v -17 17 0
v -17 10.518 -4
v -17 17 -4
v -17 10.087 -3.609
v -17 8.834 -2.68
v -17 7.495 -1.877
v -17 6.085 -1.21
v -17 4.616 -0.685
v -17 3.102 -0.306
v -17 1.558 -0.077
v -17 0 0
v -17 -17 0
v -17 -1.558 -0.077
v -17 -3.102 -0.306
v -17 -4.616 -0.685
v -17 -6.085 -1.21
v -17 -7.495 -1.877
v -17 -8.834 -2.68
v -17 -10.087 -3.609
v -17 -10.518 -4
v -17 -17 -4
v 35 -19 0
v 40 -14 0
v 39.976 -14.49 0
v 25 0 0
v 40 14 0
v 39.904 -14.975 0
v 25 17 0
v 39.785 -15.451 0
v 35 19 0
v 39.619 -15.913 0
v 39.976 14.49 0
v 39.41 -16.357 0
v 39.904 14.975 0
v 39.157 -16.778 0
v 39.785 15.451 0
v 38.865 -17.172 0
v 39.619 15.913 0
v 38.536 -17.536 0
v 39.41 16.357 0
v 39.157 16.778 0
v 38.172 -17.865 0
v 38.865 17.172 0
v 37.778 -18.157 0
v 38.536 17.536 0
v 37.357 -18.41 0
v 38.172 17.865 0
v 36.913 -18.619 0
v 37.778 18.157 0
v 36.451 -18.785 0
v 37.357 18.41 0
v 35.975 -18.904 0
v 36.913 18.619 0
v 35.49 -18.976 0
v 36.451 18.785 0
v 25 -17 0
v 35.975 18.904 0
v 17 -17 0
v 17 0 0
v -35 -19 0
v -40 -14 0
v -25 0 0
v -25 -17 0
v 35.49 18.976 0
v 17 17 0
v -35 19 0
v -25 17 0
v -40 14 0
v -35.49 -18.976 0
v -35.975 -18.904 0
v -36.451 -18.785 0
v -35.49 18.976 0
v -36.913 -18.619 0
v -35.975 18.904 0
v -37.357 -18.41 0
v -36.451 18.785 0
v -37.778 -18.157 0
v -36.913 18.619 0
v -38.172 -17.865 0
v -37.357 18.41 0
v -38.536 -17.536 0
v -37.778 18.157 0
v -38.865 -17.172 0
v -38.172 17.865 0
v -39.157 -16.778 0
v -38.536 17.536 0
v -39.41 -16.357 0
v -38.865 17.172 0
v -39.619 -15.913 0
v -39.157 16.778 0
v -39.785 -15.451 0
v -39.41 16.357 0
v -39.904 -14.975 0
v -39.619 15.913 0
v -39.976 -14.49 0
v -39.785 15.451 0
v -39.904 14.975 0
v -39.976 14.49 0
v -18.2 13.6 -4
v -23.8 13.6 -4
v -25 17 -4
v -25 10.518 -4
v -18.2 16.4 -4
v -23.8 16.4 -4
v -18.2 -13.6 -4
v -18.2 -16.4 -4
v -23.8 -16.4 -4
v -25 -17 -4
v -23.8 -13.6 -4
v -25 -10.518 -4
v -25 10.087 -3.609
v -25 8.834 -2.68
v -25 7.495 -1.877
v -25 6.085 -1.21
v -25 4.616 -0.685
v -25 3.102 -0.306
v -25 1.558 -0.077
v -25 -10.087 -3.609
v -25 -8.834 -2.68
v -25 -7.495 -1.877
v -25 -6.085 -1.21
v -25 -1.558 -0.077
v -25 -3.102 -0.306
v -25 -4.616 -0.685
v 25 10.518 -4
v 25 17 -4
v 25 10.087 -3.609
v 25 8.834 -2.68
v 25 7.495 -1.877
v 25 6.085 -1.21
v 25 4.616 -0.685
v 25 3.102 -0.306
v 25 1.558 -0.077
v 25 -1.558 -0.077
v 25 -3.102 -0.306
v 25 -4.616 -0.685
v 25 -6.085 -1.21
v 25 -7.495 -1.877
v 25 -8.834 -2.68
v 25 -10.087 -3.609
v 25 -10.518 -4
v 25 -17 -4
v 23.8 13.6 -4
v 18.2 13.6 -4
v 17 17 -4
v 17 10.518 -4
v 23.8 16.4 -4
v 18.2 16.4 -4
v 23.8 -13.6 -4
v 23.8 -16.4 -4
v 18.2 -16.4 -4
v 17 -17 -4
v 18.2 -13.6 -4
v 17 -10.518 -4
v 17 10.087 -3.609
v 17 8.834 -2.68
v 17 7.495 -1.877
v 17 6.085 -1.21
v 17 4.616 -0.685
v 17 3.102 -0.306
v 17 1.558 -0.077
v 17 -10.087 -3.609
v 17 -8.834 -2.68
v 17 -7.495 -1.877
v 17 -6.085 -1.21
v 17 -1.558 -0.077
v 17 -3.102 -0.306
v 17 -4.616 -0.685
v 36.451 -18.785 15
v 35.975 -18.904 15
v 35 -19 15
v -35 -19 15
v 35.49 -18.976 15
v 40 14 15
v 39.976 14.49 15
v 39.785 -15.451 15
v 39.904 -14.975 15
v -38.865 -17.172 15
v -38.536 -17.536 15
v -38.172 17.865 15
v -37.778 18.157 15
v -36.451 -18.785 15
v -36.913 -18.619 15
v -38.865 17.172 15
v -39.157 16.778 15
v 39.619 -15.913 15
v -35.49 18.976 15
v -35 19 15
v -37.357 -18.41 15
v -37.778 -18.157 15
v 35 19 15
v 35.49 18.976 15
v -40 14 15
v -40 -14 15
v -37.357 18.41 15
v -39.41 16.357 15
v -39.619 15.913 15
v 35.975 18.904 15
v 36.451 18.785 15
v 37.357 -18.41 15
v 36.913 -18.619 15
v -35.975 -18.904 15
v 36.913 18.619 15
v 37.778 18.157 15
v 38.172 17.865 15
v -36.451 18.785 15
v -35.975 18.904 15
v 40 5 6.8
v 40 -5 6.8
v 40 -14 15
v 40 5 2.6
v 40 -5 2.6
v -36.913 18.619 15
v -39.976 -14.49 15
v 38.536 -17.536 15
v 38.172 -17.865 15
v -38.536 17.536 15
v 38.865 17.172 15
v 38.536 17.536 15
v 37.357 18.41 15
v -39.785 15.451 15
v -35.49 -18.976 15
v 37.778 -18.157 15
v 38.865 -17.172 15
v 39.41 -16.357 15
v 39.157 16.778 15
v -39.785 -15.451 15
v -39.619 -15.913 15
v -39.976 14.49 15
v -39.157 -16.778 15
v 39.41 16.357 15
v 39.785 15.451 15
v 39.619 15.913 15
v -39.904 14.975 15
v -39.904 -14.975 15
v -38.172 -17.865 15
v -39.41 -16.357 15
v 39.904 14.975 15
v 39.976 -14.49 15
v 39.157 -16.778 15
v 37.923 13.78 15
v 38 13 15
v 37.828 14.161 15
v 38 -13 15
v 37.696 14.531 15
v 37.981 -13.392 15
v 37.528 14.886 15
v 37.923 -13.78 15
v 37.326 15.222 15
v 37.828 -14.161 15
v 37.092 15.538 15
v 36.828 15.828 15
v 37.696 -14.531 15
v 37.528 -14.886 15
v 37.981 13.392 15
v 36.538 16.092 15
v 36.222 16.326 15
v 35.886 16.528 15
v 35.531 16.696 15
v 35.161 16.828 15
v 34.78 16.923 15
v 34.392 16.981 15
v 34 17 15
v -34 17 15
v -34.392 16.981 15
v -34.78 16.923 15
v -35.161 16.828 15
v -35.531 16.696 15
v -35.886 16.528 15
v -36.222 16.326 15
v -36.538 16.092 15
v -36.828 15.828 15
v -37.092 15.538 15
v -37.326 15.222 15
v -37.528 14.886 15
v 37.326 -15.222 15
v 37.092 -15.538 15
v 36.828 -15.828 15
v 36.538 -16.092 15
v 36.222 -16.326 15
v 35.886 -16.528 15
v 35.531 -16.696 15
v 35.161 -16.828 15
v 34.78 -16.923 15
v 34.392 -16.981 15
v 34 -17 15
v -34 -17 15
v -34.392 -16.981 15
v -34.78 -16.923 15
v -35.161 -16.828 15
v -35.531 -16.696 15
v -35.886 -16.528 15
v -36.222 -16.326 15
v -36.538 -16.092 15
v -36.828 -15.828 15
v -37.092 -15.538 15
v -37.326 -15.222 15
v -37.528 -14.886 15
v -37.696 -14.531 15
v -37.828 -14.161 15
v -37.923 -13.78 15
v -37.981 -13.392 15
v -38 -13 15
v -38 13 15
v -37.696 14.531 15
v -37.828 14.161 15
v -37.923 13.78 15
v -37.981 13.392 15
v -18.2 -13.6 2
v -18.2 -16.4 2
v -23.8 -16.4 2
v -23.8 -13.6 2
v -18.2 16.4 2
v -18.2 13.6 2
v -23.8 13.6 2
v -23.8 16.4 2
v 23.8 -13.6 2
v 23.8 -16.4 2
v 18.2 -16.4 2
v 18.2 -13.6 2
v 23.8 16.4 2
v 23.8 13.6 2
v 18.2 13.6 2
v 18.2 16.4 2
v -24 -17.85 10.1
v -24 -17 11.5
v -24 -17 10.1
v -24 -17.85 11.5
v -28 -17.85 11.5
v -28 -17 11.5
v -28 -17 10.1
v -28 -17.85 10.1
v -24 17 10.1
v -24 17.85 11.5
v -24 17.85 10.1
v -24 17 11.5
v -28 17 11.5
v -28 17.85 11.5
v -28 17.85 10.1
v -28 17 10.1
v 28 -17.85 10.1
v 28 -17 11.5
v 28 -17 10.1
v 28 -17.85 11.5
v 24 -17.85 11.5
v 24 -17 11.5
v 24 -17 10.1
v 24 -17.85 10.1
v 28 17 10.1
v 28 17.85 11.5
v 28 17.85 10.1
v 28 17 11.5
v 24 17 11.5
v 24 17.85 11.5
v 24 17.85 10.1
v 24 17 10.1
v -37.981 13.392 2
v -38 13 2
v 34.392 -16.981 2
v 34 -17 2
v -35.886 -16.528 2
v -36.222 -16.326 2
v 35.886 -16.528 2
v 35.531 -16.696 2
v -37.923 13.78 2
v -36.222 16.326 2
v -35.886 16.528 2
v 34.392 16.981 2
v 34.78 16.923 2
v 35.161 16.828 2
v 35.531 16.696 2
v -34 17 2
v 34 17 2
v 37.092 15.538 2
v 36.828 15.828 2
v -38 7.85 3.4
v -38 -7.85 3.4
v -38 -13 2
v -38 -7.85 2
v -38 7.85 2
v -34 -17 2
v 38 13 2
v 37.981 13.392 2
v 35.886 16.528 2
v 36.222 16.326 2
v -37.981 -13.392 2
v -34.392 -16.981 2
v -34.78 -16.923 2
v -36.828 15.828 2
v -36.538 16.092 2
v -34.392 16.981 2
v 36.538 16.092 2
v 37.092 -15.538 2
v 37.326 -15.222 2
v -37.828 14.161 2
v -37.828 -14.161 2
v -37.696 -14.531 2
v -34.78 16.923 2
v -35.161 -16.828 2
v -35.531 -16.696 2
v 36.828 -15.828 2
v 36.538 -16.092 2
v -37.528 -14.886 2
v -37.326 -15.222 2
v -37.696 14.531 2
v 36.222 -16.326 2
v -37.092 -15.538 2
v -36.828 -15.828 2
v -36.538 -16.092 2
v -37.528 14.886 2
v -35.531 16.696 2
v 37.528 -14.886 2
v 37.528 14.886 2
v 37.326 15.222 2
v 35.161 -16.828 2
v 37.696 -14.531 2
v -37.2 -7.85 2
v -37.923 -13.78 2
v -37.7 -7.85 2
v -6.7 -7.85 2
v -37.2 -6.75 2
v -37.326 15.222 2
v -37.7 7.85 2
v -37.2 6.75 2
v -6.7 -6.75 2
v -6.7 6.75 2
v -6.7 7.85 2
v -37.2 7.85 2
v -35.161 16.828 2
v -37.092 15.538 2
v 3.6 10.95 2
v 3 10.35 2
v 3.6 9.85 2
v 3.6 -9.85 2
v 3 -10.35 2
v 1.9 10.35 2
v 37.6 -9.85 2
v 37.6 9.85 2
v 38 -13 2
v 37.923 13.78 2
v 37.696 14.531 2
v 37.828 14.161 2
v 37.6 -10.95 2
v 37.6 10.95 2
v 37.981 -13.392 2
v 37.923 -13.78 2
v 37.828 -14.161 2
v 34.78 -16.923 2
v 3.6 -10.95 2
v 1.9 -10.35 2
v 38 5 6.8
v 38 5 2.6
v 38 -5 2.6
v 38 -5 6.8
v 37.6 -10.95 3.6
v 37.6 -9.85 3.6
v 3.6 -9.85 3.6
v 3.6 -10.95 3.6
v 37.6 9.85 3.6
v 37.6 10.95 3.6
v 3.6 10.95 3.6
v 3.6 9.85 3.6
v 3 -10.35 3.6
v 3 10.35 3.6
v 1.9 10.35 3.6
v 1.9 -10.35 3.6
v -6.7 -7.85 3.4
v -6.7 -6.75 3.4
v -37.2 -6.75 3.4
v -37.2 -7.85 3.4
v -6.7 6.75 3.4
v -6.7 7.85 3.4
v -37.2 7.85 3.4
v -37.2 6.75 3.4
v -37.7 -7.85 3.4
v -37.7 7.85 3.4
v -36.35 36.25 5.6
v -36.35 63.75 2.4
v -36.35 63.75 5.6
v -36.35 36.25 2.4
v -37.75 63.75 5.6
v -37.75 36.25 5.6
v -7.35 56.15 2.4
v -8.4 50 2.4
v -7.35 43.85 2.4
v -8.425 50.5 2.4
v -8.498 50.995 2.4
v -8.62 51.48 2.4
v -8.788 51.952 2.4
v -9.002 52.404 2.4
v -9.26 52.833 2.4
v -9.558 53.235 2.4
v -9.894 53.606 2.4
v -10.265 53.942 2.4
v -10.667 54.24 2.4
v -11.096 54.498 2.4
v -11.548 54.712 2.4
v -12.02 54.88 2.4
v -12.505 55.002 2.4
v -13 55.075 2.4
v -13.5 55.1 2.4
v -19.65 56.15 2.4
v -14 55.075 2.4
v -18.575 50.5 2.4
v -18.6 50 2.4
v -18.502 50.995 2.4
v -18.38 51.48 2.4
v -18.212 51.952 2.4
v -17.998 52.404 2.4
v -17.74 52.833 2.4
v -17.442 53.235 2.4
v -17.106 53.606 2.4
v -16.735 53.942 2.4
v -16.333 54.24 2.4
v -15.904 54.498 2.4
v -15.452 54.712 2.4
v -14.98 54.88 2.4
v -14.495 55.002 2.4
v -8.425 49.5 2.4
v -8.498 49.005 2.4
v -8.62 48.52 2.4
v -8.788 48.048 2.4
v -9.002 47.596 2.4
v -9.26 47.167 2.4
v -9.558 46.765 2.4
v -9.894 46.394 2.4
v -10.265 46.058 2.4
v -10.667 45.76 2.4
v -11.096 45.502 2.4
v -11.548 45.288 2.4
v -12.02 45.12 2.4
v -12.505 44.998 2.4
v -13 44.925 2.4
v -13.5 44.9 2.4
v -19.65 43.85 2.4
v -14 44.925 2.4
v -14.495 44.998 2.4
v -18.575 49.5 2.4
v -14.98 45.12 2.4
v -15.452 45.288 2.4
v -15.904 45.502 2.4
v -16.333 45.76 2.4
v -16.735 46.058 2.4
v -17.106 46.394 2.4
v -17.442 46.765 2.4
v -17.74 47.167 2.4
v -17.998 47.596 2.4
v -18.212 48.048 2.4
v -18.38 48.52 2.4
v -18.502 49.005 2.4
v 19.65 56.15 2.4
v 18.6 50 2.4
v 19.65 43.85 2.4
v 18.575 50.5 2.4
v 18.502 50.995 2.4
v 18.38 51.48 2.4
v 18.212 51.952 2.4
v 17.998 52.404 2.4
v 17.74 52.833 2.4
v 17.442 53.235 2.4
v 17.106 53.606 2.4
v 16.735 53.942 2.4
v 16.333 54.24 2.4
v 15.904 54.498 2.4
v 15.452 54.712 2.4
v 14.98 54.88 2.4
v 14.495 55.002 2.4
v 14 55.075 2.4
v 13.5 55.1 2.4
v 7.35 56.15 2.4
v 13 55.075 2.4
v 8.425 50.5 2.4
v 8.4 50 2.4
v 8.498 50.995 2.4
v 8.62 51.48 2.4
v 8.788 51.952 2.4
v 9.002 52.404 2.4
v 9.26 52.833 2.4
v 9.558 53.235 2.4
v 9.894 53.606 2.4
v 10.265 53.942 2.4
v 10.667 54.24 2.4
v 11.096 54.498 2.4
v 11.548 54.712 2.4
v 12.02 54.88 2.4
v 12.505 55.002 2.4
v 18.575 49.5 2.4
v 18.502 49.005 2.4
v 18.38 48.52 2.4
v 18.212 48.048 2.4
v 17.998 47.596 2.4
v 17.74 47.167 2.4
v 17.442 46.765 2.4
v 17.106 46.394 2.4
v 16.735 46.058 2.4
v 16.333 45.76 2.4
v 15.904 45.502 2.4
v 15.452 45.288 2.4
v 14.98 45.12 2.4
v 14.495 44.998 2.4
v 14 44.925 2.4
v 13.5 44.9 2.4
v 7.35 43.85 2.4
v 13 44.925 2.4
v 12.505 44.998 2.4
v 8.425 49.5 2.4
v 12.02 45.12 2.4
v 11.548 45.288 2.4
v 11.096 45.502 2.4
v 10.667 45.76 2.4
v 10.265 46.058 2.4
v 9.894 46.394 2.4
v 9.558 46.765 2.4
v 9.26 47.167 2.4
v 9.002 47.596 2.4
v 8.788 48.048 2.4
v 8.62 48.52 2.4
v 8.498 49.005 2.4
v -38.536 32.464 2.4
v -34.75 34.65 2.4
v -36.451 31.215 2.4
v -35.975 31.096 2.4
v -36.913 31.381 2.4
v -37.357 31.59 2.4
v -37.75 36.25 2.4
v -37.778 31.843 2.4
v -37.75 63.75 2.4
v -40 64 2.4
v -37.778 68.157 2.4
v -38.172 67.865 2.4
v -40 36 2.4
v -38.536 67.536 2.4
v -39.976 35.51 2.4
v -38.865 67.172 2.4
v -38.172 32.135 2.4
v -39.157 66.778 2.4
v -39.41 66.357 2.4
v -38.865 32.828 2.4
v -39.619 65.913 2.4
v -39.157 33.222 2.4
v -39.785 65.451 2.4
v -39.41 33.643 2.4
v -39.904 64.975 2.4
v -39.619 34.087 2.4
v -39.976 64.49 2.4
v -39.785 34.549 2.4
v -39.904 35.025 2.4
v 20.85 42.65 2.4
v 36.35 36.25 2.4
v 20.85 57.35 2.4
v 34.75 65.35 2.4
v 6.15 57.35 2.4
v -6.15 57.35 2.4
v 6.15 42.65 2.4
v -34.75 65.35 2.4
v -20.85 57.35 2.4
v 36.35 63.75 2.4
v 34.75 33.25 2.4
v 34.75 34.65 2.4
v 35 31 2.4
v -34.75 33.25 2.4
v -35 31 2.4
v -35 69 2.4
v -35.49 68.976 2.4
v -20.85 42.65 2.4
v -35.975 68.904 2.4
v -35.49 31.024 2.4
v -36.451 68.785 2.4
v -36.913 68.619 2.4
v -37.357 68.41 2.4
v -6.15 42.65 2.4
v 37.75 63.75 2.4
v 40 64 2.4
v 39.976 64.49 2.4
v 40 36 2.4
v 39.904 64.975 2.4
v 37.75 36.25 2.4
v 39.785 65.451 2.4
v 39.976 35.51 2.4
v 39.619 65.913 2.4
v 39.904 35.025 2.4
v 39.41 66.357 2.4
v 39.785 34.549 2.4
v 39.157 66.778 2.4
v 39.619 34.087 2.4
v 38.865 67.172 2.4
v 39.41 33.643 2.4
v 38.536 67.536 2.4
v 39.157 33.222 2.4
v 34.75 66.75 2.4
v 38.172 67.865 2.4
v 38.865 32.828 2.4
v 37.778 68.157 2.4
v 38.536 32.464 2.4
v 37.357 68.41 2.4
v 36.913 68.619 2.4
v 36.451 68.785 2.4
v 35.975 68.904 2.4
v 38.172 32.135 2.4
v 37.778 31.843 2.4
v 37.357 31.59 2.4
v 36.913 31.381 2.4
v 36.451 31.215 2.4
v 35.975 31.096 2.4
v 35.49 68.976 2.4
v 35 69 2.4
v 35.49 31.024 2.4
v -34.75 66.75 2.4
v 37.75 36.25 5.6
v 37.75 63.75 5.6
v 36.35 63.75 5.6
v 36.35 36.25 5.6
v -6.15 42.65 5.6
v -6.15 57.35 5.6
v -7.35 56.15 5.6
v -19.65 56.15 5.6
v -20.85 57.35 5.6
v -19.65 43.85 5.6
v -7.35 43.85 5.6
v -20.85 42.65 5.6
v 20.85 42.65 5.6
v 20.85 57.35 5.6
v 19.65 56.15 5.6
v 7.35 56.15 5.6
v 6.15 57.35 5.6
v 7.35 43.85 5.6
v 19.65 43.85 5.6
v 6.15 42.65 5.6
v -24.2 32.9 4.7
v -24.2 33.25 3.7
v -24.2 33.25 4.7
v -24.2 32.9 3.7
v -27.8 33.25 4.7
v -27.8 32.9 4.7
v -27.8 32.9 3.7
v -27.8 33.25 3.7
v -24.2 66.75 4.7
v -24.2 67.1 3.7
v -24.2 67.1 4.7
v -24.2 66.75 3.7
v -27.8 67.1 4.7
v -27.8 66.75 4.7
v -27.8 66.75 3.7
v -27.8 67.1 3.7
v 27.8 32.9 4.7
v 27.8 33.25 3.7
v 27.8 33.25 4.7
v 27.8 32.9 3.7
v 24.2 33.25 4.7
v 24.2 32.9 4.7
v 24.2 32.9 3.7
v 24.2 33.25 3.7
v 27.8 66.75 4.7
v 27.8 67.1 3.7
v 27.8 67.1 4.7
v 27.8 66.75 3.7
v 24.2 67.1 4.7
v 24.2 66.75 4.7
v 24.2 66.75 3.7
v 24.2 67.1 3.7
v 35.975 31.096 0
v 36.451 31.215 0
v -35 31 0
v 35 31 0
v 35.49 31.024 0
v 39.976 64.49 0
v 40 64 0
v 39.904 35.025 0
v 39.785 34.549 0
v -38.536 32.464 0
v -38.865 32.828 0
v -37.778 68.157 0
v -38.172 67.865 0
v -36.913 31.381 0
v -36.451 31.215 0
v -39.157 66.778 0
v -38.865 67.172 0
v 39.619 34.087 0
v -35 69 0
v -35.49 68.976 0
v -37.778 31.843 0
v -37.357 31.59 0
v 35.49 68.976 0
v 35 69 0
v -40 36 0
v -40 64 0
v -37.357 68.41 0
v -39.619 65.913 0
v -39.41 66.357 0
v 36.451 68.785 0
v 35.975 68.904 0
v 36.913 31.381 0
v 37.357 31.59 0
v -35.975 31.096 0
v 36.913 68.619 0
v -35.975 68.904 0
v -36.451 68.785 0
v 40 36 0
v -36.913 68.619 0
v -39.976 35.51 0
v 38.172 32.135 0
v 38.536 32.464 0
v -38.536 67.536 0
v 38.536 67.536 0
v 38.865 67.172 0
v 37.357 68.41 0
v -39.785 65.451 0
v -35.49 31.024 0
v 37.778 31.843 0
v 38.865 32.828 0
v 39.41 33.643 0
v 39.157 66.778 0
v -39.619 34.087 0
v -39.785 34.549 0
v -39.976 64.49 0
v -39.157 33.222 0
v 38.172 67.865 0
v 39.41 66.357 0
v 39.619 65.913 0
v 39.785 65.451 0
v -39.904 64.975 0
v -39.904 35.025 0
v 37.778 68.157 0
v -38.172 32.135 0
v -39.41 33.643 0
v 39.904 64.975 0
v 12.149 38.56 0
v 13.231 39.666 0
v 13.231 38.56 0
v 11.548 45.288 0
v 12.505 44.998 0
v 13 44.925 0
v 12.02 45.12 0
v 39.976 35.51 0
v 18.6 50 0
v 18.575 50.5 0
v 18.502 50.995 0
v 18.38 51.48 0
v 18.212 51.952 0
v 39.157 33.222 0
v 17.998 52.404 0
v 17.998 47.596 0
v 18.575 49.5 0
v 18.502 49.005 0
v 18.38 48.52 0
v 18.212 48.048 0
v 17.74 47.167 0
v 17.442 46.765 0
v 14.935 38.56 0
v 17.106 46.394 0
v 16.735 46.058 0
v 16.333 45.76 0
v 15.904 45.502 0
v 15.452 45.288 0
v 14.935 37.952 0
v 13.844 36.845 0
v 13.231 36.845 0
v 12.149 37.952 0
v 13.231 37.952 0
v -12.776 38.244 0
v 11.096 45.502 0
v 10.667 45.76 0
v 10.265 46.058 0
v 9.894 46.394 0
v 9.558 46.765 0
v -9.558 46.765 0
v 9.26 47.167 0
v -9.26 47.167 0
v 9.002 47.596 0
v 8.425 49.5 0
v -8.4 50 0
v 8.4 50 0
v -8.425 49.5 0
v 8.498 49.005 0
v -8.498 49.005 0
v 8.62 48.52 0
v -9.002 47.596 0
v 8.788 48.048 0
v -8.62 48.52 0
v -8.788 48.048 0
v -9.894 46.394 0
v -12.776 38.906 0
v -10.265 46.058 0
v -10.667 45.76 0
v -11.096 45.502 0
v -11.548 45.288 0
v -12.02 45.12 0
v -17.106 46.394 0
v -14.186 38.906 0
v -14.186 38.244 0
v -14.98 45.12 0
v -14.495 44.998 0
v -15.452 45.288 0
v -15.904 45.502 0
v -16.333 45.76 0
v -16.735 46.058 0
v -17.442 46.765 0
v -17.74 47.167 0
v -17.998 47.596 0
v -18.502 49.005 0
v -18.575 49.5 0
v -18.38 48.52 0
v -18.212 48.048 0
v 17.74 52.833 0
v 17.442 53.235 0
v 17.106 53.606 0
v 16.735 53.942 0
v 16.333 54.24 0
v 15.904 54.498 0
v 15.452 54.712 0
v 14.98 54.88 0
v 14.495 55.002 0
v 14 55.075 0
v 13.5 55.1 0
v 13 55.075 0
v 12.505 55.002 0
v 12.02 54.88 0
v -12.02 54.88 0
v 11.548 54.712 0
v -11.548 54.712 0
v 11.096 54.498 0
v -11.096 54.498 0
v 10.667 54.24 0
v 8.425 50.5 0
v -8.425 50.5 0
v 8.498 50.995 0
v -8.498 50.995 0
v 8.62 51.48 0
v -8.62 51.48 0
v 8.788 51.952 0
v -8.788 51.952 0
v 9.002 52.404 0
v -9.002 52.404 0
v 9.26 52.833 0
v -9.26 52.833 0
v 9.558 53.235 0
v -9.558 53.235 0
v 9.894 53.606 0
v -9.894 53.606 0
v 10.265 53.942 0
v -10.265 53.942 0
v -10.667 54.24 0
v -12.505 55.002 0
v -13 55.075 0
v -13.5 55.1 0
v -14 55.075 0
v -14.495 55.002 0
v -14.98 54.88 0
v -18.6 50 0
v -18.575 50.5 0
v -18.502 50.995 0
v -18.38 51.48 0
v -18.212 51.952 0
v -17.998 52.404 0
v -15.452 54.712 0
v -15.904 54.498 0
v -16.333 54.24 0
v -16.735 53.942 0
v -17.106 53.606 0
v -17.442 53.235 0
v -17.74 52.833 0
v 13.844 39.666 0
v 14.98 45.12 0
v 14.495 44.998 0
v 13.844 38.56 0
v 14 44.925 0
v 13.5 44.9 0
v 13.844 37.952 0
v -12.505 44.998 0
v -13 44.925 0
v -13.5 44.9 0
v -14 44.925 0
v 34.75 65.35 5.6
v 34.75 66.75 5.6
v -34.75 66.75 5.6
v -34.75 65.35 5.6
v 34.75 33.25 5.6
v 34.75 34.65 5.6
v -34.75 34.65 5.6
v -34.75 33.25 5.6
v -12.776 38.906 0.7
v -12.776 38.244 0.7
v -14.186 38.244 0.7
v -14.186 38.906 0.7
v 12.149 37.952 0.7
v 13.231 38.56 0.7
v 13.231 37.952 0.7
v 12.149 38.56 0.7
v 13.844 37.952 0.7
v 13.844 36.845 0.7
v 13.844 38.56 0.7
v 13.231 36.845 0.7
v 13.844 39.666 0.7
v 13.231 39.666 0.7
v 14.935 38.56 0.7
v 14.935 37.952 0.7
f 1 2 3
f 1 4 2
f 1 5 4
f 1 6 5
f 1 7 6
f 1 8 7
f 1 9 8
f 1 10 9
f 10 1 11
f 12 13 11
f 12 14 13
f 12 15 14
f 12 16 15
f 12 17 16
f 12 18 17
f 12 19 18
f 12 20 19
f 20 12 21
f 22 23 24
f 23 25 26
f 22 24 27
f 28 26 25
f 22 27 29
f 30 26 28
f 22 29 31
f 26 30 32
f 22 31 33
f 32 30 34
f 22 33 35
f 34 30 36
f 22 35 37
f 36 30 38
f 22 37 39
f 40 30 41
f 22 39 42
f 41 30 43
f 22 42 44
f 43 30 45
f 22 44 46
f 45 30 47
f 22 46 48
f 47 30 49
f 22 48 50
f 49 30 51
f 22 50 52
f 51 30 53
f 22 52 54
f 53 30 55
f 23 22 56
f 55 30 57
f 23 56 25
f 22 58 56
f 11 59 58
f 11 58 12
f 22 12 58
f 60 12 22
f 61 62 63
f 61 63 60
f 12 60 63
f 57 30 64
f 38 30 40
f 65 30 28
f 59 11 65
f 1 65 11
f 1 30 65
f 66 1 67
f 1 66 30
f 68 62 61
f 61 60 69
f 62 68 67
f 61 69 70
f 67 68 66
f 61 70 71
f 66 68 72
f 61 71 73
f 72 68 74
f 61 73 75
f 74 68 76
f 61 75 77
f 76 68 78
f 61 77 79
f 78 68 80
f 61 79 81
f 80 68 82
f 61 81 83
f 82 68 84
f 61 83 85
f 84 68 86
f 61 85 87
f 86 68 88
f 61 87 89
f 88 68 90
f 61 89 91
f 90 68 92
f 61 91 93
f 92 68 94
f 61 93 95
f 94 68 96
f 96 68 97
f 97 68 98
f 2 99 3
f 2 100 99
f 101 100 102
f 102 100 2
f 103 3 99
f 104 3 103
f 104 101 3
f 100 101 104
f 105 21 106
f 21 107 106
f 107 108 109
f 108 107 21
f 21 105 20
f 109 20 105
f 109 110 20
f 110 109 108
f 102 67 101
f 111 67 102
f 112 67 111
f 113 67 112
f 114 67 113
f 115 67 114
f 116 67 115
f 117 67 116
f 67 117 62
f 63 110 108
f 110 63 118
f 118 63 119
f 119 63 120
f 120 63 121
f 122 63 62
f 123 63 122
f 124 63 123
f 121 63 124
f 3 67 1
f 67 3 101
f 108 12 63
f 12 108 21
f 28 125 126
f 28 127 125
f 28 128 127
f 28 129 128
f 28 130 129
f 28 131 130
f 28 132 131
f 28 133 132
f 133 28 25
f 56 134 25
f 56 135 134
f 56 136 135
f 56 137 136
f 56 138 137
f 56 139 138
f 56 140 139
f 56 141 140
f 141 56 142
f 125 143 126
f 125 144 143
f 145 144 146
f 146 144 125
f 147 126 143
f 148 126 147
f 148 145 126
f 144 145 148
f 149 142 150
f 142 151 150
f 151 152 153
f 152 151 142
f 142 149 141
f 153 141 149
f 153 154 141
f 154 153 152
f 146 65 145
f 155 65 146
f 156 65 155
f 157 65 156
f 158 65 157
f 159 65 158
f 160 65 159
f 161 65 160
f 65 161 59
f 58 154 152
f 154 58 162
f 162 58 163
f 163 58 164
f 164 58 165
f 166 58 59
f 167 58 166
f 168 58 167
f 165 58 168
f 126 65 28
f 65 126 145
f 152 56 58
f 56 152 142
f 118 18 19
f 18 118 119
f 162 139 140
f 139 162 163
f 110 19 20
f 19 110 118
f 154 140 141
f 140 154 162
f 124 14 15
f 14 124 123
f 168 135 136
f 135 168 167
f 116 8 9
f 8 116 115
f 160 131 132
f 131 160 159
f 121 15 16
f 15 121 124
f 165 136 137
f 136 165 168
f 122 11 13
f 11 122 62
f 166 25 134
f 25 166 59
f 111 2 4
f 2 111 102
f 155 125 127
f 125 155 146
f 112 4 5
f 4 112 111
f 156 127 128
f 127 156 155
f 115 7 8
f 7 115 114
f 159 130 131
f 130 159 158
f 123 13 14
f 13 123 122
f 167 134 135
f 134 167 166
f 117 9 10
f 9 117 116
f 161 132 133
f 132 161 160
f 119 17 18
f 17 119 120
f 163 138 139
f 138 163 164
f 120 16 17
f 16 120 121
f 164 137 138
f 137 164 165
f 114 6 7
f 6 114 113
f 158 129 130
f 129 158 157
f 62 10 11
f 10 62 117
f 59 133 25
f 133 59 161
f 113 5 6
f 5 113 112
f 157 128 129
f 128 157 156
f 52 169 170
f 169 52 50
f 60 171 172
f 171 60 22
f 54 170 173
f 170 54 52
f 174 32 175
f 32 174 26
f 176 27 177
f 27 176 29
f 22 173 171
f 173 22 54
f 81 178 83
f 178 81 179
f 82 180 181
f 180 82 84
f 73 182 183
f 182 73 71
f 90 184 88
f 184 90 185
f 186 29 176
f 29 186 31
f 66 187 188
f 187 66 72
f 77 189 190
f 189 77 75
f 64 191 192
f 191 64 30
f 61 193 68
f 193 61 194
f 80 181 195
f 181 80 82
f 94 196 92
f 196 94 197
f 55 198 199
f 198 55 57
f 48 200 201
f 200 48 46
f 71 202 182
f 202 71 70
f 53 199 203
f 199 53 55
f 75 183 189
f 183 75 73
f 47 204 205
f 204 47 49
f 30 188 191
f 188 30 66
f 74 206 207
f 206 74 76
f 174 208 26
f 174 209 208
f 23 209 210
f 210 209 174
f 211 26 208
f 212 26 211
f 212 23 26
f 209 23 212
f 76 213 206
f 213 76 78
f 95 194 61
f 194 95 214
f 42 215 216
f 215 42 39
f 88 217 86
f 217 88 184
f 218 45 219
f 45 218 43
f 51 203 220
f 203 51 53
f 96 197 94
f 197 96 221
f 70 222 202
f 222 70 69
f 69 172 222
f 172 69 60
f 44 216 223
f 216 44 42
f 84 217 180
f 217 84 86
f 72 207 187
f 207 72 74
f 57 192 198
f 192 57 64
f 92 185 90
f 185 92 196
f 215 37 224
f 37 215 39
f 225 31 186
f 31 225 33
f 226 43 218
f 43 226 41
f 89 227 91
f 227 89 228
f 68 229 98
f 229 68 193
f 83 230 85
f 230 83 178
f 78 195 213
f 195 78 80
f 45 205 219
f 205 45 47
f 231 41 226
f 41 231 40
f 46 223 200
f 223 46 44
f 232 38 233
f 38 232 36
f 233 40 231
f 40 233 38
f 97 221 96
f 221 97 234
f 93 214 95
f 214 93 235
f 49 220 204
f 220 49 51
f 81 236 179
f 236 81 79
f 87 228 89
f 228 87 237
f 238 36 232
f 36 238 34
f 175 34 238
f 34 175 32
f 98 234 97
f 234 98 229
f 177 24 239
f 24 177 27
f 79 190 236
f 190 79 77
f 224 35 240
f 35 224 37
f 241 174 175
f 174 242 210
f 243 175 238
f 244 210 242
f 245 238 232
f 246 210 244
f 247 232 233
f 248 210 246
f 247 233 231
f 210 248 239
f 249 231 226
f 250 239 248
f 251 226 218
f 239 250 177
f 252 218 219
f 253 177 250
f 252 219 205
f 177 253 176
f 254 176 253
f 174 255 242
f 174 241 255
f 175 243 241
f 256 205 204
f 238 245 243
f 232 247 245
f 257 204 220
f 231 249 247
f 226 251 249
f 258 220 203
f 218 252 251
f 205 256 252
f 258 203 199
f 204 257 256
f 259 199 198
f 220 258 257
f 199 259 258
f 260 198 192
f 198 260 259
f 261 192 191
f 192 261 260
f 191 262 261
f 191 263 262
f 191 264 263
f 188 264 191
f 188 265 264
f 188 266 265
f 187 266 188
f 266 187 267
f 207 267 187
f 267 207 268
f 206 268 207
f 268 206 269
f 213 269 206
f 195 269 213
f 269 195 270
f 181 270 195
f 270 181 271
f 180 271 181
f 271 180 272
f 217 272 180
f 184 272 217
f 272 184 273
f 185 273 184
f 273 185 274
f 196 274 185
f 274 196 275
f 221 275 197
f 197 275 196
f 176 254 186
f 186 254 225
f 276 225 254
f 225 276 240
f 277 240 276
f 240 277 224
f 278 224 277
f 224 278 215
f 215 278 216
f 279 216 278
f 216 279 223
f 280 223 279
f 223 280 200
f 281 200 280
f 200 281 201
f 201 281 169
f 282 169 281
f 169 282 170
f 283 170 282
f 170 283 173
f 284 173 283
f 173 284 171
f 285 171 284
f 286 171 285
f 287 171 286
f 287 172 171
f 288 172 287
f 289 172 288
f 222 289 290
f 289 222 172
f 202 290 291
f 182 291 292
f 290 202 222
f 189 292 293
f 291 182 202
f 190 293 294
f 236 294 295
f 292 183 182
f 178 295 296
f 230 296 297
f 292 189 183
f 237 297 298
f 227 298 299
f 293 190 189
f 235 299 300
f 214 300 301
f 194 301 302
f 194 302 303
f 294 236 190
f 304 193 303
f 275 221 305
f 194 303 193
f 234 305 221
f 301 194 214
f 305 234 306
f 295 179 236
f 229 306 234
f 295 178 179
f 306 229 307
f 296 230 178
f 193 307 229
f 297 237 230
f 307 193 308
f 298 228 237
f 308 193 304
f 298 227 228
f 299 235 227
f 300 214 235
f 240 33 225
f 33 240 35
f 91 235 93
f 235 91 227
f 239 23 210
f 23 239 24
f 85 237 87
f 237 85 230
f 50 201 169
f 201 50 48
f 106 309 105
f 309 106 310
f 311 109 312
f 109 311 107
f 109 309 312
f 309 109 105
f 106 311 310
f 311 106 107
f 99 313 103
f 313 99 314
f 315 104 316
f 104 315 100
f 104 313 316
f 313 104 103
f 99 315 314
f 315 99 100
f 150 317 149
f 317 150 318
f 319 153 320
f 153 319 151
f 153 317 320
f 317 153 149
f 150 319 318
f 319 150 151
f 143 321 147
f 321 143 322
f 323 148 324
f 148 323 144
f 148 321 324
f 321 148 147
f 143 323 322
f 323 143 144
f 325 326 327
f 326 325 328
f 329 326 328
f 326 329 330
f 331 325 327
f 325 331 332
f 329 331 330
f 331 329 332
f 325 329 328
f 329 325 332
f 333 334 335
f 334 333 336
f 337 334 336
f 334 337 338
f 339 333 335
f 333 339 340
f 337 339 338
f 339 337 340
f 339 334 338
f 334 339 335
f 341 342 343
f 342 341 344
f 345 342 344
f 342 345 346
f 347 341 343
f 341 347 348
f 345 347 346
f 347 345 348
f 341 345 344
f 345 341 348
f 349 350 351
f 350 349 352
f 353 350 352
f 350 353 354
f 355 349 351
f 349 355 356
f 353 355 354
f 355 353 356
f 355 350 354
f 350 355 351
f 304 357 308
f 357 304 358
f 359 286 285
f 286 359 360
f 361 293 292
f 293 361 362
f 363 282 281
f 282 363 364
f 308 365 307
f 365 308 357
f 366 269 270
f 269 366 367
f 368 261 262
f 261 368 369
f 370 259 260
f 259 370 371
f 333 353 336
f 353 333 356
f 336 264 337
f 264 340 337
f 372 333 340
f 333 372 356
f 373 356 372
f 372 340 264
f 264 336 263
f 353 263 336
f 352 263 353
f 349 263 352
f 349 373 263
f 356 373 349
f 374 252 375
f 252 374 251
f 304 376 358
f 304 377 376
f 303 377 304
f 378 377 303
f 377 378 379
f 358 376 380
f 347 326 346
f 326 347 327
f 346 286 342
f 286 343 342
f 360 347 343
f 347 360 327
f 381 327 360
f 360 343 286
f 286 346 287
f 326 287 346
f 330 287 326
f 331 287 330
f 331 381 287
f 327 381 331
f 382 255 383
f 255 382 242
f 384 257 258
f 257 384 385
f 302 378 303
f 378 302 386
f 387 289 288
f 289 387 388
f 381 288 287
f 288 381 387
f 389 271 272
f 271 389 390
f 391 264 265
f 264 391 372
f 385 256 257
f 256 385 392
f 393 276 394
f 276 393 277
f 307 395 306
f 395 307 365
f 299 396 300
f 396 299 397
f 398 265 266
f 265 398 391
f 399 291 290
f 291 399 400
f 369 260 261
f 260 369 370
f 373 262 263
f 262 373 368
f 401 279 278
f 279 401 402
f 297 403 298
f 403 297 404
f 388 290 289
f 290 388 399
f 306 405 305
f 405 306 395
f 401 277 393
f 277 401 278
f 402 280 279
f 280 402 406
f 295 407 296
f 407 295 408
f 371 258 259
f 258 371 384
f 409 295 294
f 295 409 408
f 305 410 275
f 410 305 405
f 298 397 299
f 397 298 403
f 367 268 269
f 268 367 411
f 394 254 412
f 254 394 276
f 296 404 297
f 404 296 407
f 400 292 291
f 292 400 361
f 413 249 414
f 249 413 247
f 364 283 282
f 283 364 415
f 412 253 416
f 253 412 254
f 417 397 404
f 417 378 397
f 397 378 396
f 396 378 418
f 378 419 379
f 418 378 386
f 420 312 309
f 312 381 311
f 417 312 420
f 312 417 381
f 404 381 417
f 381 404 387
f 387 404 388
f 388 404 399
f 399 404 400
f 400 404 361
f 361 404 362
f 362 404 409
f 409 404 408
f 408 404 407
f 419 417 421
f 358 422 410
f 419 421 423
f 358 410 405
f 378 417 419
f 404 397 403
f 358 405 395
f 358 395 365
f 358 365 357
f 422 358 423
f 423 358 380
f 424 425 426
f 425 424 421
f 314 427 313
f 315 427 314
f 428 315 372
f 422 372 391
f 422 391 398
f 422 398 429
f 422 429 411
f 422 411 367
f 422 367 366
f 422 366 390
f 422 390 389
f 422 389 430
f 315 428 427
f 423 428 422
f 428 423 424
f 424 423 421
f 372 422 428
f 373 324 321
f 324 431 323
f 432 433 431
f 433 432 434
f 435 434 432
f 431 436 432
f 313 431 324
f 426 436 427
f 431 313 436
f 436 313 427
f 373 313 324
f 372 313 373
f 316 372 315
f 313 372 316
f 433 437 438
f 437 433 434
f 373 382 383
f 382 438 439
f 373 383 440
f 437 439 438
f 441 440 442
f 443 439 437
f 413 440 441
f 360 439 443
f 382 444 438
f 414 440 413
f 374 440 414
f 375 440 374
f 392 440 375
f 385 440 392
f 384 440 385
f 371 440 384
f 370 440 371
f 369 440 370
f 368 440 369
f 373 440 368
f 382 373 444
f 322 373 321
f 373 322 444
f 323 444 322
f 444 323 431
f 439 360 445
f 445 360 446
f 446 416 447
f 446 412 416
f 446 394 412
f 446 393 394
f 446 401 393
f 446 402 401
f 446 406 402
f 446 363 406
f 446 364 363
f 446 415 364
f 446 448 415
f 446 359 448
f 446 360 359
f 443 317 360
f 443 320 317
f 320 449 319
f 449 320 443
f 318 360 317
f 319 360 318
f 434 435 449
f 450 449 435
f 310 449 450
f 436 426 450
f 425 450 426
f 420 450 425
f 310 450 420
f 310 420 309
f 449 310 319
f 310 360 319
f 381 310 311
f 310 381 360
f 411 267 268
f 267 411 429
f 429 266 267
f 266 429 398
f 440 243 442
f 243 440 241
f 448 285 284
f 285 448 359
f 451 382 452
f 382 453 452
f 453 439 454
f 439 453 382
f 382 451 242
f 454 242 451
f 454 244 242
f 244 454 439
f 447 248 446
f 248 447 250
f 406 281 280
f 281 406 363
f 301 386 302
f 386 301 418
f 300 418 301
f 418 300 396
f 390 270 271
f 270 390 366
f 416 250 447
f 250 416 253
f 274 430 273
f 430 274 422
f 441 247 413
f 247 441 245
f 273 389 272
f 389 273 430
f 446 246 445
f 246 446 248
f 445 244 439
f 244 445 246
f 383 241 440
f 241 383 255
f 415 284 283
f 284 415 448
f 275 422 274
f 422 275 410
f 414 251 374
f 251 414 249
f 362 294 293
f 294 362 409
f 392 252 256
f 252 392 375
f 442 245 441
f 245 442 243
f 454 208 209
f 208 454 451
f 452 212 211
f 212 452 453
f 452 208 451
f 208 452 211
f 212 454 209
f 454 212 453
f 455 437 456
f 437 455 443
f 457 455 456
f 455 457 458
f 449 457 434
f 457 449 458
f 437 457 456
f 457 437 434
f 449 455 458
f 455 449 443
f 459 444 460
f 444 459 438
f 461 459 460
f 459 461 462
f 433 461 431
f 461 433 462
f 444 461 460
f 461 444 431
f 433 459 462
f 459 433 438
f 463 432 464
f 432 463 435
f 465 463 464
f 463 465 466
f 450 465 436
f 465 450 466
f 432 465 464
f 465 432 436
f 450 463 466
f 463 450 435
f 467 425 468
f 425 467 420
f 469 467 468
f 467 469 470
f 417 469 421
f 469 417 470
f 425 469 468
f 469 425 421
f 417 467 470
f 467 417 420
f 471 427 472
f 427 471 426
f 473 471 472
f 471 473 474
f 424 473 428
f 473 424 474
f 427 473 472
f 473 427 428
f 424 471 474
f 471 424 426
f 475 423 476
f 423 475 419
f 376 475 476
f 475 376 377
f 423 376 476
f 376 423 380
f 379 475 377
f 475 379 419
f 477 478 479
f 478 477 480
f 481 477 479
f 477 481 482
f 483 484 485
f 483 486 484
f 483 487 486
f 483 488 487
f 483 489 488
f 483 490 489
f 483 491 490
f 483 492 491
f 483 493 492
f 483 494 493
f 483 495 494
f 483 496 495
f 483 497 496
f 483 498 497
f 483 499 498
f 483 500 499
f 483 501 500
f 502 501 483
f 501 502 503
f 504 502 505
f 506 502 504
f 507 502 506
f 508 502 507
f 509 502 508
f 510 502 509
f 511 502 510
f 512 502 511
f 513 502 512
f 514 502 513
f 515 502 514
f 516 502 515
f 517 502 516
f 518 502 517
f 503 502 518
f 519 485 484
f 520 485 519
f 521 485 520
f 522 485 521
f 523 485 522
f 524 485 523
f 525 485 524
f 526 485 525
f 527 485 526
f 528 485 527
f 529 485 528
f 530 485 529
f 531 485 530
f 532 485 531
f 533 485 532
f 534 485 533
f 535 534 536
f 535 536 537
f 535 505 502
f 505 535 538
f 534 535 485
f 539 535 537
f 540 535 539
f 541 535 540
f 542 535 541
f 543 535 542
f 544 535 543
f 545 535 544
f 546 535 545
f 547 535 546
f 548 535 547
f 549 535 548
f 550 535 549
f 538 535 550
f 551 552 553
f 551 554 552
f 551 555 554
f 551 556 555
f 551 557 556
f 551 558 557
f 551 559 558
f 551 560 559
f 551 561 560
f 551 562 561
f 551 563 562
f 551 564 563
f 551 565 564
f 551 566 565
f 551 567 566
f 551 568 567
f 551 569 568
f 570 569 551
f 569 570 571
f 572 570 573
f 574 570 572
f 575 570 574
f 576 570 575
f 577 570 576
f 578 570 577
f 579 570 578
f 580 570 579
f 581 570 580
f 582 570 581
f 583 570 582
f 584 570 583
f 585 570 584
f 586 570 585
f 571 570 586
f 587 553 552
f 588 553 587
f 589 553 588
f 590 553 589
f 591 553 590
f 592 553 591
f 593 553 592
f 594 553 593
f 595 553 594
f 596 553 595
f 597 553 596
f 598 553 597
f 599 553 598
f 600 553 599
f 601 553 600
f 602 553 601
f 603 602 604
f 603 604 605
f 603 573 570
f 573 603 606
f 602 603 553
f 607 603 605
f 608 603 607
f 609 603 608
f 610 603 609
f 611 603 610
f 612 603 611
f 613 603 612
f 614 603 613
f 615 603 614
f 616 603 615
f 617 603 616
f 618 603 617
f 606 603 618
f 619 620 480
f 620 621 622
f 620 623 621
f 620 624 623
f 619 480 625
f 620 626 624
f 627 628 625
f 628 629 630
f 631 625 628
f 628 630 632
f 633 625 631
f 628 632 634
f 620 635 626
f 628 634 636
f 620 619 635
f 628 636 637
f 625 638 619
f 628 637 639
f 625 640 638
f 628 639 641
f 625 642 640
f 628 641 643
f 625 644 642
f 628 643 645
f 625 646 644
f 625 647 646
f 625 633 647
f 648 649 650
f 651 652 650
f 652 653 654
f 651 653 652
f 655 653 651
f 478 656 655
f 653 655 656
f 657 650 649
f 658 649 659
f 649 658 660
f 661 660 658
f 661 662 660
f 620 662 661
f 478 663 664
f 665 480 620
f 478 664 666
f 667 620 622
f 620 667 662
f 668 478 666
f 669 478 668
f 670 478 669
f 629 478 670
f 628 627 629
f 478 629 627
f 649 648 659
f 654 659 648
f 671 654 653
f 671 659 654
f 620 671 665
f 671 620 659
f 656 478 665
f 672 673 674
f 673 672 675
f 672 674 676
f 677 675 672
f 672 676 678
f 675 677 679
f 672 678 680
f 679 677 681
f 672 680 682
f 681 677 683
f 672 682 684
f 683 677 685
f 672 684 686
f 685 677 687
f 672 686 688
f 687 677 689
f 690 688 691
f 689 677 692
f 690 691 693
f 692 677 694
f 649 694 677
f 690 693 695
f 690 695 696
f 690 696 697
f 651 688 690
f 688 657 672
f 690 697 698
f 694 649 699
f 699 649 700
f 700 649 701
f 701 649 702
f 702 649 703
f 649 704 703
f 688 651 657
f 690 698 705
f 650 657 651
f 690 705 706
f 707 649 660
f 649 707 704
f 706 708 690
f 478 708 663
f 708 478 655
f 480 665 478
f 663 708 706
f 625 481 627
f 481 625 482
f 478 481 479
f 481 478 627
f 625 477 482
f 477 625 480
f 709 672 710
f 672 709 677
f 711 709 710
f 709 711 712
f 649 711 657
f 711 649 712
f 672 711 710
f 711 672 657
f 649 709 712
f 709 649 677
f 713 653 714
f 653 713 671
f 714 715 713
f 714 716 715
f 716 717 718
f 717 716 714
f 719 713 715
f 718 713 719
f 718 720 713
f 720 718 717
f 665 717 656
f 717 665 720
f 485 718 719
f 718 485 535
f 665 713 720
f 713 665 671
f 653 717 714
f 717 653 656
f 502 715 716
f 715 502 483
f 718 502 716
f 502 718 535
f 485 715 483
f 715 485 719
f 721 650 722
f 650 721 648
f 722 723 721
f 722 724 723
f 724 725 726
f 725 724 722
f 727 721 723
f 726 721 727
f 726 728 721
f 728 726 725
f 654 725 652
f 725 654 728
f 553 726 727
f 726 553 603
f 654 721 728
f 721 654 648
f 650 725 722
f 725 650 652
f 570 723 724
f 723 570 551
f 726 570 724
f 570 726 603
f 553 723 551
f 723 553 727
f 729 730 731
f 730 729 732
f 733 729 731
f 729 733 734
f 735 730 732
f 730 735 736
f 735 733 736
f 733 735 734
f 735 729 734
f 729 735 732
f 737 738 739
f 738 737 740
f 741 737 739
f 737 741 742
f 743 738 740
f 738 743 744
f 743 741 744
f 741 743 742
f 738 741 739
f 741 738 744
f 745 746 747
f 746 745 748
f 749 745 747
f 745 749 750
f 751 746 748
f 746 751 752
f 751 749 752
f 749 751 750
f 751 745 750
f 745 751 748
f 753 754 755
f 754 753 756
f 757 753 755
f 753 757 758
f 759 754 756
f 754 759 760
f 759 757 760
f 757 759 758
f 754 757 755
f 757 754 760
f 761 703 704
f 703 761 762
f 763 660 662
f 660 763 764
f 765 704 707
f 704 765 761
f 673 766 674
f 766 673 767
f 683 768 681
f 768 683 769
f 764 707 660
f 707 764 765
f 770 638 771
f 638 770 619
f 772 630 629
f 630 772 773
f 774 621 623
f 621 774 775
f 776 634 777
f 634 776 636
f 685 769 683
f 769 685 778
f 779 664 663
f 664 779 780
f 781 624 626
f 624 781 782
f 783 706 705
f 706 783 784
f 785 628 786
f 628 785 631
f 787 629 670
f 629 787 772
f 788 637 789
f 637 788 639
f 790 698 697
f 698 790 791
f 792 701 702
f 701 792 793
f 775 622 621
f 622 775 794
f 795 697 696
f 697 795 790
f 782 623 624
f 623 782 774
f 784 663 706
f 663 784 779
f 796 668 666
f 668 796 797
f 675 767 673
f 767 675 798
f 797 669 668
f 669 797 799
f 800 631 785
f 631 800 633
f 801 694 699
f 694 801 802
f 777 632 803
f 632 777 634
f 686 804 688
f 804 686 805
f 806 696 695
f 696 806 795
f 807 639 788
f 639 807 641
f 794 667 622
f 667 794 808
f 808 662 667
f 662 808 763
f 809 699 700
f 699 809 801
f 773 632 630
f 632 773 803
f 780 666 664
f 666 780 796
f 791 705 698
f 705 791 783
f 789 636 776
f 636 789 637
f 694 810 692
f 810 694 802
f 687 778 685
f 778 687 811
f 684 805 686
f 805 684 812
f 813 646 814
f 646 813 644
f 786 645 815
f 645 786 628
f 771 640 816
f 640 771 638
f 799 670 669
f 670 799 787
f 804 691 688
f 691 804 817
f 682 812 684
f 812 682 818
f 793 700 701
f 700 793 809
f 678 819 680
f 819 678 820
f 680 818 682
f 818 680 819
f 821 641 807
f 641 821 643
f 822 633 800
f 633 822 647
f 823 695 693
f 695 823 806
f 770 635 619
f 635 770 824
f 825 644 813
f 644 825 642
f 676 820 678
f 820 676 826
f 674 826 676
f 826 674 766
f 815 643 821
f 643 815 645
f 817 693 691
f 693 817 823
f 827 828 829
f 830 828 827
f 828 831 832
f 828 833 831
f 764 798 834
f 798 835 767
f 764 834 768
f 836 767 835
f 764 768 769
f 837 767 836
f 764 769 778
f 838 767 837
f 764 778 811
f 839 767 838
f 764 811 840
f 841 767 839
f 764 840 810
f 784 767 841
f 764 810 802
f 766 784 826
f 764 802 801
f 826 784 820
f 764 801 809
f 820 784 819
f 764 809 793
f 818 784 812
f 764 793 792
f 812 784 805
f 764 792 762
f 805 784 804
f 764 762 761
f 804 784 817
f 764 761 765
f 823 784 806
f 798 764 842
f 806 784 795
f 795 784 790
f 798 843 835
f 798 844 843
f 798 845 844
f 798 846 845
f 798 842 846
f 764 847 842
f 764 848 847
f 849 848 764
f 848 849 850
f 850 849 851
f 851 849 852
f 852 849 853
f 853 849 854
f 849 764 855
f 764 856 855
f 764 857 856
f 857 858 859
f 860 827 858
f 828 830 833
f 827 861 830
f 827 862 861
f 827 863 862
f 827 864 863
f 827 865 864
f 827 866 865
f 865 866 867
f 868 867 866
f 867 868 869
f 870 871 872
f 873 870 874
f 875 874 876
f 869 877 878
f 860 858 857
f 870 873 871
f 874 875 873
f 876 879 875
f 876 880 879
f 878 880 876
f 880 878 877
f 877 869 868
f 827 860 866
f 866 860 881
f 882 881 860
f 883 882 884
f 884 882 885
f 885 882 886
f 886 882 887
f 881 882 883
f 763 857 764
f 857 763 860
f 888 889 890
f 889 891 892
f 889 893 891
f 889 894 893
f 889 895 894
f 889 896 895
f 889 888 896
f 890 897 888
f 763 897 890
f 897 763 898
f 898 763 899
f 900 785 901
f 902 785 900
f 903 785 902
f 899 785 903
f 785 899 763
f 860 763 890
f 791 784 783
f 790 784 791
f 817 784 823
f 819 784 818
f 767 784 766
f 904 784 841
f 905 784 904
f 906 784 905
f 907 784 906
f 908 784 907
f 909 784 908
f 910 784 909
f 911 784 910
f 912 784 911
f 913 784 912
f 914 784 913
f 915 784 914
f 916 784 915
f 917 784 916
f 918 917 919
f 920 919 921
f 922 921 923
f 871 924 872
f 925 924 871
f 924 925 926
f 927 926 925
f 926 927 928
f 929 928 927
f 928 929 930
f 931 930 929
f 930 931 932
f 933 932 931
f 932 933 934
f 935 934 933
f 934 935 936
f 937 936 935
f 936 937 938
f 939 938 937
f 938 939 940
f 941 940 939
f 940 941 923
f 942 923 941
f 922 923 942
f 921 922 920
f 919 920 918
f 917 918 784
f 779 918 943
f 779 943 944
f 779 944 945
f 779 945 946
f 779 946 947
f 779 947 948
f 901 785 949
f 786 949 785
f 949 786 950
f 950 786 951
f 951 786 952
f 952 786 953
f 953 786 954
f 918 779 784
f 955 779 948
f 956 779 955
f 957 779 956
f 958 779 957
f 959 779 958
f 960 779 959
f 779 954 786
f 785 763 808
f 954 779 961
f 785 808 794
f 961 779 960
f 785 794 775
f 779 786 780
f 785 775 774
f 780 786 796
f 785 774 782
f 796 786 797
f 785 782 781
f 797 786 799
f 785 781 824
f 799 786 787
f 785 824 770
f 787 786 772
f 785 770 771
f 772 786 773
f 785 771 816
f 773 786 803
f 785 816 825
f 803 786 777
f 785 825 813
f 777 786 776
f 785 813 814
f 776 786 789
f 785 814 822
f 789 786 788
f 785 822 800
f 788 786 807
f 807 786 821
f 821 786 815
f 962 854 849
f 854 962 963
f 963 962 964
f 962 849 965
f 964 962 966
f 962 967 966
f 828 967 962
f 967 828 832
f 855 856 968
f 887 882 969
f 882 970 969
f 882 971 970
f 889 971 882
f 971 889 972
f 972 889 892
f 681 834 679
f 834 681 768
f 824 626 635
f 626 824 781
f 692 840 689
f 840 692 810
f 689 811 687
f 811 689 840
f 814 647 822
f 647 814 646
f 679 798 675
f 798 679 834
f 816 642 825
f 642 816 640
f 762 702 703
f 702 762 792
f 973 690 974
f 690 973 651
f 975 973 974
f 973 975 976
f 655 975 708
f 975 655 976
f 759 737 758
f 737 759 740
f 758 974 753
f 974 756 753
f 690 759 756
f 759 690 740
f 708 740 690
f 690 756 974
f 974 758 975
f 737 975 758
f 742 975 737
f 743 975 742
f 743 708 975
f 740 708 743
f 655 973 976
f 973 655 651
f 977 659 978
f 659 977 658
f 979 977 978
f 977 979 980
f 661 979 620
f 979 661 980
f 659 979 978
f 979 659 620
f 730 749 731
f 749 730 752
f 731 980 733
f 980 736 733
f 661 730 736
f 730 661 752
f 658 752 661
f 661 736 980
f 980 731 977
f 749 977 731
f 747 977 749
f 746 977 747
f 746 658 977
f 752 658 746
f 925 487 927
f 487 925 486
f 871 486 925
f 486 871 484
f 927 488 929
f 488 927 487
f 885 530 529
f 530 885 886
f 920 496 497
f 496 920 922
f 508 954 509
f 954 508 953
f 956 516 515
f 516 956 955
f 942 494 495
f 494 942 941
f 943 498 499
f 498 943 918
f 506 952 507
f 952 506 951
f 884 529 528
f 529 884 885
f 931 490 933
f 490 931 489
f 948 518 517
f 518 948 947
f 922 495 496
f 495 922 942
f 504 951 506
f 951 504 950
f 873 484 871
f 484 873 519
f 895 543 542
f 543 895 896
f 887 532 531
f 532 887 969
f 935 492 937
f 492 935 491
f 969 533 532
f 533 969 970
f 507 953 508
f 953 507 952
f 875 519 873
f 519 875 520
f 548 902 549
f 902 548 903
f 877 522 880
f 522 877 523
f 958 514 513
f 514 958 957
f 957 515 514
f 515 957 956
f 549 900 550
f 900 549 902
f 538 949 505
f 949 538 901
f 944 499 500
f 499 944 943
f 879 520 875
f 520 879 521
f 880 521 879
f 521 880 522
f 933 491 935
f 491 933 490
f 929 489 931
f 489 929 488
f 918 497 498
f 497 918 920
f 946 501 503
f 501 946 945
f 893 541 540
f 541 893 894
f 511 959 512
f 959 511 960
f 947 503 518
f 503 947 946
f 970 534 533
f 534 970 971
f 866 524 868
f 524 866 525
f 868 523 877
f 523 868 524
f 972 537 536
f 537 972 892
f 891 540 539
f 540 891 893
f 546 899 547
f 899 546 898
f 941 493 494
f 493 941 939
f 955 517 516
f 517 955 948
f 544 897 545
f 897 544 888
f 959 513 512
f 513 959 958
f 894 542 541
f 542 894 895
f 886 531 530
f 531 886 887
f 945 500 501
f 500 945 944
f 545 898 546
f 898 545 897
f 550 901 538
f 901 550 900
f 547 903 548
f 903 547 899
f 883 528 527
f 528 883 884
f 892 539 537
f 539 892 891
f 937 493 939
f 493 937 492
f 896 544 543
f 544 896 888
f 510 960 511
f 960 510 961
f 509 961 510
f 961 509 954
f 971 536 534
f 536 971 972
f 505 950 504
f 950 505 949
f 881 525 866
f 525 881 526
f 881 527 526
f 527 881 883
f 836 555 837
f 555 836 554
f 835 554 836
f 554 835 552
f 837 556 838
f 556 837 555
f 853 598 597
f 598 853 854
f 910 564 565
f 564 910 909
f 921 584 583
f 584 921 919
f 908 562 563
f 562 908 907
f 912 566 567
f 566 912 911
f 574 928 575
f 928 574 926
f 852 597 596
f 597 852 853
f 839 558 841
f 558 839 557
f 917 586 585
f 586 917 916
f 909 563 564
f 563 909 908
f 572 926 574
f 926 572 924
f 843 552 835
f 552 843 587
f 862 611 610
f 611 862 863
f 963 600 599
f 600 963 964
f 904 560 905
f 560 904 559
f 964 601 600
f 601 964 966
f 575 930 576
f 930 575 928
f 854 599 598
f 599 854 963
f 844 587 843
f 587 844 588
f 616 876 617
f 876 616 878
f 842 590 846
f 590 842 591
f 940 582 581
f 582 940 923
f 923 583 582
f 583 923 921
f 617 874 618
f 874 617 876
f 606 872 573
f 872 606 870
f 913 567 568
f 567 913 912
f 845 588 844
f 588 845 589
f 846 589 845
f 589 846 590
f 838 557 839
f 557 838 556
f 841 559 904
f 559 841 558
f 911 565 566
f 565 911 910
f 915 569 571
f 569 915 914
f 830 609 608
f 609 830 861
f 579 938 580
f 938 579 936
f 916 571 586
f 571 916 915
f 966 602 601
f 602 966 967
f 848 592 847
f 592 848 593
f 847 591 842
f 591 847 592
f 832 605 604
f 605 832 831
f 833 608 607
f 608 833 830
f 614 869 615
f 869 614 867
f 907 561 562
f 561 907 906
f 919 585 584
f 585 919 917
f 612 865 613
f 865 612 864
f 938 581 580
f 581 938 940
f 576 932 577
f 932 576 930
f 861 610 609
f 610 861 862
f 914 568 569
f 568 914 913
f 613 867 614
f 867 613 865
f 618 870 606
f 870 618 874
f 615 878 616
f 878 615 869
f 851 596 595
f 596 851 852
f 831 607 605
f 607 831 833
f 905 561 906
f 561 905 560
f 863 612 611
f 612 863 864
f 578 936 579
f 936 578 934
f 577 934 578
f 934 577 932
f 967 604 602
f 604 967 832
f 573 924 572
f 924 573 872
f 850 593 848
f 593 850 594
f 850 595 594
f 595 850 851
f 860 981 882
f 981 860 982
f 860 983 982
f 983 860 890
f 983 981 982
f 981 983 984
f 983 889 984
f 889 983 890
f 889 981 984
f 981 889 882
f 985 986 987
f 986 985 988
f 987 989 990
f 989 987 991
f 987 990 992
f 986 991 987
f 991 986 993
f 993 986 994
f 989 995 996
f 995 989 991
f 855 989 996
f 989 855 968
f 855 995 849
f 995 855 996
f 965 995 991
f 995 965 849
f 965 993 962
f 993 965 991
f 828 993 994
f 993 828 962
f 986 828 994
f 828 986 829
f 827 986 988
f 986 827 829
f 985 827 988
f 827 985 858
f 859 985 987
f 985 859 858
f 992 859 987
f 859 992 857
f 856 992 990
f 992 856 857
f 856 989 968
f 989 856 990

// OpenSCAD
// MyWhoosh BLE shifter enclosure
// nice!nano v2-compatible nRF52840 board + two tactile switches + 301230 LiPo
// Units: millimetres. Change `part` to export one component.

part = "both";  // "bottom", "lid", or "both"
$fn = 64;

// Printer fit tuning
fit_clearance = 0.25;
wall = 2.0;
roof = 2.4;

// Case
// Extra length preserves roughly 10 mm between the board antenna and LiPo pouch.
case_length = 80;
case_width = 38;
corner_radius = 5;

// Pro Micro / nice!nano v2-compatible board envelope. Measure clones before printing.
board_length = 34.0;
board_width = 18.5;
board_height = 5.0;
board_clearance = 0.6;
usb_width = 10.0;
usb_height = 4.2;

// Reference rechargeable cell: protected 301230 LiPo (nominally 30 x 12 x 3 mm).
// These are locator dimensions, not a clamp; enlarge them for the measured cell.
battery_length = 30.5;
battery_width = 12.5;
battery_height = 3.5;
battery_clearance = 0.5;

// Preserve vertical room for the board/cell, wiring, and switch bodies.
bottom_height = max(15, wall + max(board_height, battery_height) + 7.5);

// 12 x 12 x 7.3 mm tactile switches with coloured caps
switch_body = 12.0;
switch_clearance = 0.3;
cap_hole = 10.2;
button_spacing = 27;
button_positions = [-button_spacing / 2, button_spacing / 2];
button_labels = ["-", "+"];

// Mounting
zip_tie_width = 5.0;
zip_tie_thickness = 2.0;
strap_spacing = 42;
handlebar_diameter = 31.8;
mount_depth = 4.0;

module rounded_prism(length, width, radius, height) {
    linear_extrude(height = height)
        offset(r = radius)
            square([length - 2 * radius, width - 2 * radius], center = true);
}

module handlebar_feet() {
    difference() {
        for (x = [-strap_spacing / 2, strap_spacing / 2])
            translate([x, 0, -mount_depth / 2])
                cube([zip_tie_width + 3.0, case_width - 4, mount_depth], center = true);

        // A shallow 31.8 mm handlebar saddle prevents the case rocking.
        translate([0, 0, -handlebar_diameter / 2])
            rotate([0, 90, 0])
                cylinder(d = handlebar_diameter, h = case_length + 2, center = true);
    }
}

module board_guides() {
    board_x = case_length / 2 - wall - board_length / 2 - 0.4;
    guide_z = wall + 0.8;

    // Low rails locate the board while leaving the side pads accessible.
    for (y = [-1, 1])
        translate([board_x, y * (board_width / 2 + board_clearance + 0.55), guide_z])
            cube([board_length, 1.1, 1.6], center = true);

    translate([board_x - board_length / 2 - board_clearance - 0.55, 0, guide_z])
        cube([1.1, board_width + 2.2, 1.6], center = true);
}

module battery_guides() {
    battery_x = -case_length / 2 + wall + battery_length / 2 + 0.8;
    guide_z = wall + 0.7;
    guide_height = 1.4;

    // The wire end faces the board and stays open. Do not force a pouch into this bay.
    for (y = [-1, 1])
        translate([
            battery_x,
            y * (battery_width / 2 + battery_clearance + 0.55),
            guide_z
        ]) cube([battery_length, 1.1, guide_height], center = true);

    translate([
        battery_x - battery_length / 2 - battery_clearance - 0.55,
        0,
        guide_z
    ]) cube([1.1, battery_width + 2 * battery_clearance + 2.2, guide_height], center = true);
}

module bottom() {
    union() {
        difference() {
            union() {
                rounded_prism(case_length, case_width, corner_radius, bottom_height);
                handlebar_feet();
            }

            // Main electronics and wiring cavity.
            translate([0, 0, wall])
                rounded_prism(
                    case_length - 2 * wall,
                    case_width - 2 * wall,
                    corner_radius - wall / 2,
                    bottom_height + 1
                );

            // USB-C opening, aligned to the connector on the board's short end.
            usb_z = wall + 2.7;
            translate([case_length / 2, 0, usb_z])
                cube([2 * wall + 2, usb_width, usb_height], center = true);

            // Two zip ties each pass through a pair of floor slots and around the bar.
            for (x = [-strap_spacing / 2, strap_spacing / 2],
                 y = [-(case_width / 2 - wall - 2), case_width / 2 - wall - 2])
                translate([x, y, (wall - mount_depth) / 2])
                    cube([
                        zip_tie_width + 0.6,
                        zip_tie_thickness + 0.8,
                        wall + mount_depth + 2
                    ], center = true);

            // Internal snap detents for the lid; they do not perforate the outer wall.
            for (x = [-26, 26], y = [-1, 1])
                translate([x, y * (case_width / 2 - wall + 0.35), bottom_height - 4.2])
                    cube([4.0, 1.0, 1.4], center = true);
        }

        board_guides();
        battery_guides();
    }
}

module switch_guide(x) {
    guide_inner = switch_body + switch_clearance;
    guide_wall = 1.2;
    guide_height = 3.2;

    for (y = [-1, 1])
        translate([x, y * (guide_inner / 2 + guide_wall / 2), roof + guide_height / 2])
            cube([guide_inner + 2 * guide_wall, guide_wall, guide_height], center = true);

    for (side = [-1, 1])
        translate([x + side * (guide_inner / 2 + guide_wall / 2), 0, roof + guide_height / 2])
            cube([guide_wall, guide_inner, guide_height], center = true);
}

module engraved_button_label(i) {
    text(button_labels[i], size = 4, halign = "center", valign = "center",
         font = "Liberation Sans:style=Bold");
}

module lid() {
    skirt_outer_length = case_length - 2 * wall - 2 * fit_clearance;
    skirt_outer_width = case_width - 2 * wall - 2 * fit_clearance;
    skirt_wall = 1.4;
    skirt_height = 3.2;

    difference() {
        union() {
            rounded_prism(case_length, case_width, corner_radius, roof);

            // Locating skirt. The lid prints with its flat outside face on the bed.
            translate([0, (skirt_outer_width - skirt_wall) / 2, roof + skirt_height / 2])
                cube([skirt_outer_length - 6, skirt_wall, skirt_height], center = true);
            translate([0, -(skirt_outer_width - skirt_wall) / 2, roof + skirt_height / 2])
                cube([skirt_outer_length - 6, skirt_wall, skirt_height], center = true);
            for (x = [-1, 1])
                translate([x * (skirt_outer_length - skirt_wall) / 2, 0, roof + skirt_height / 2])
                    cube([skirt_wall, skirt_outer_width - 6, skirt_height], center = true);

            for (x = button_positions)
                switch_guide(x);

            // Small bumps engage the bottom's internal detents.
            for (x = [-26, 26], y = [-1, 1])
                translate([x, y * skirt_outer_width / 2, roof + 1.8])
                    cube([3.6, 0.7, 1.0], center = true);
        }

        for (x = button_positions)
            translate([x, 0, -0.1])
                cylinder(d = cap_hole, h = roof + 0.2);

        // Engraved outside-face labels match the documented button order.
        for (i = [0 : len(button_positions) - 1])
            translate([button_positions[i], -12, -0.1])
                linear_extrude(height = 0.8)
                    engraved_button_label(i);
    }
}

if (part == "bottom") {
    bottom();
} else if (part == "lid") {
    lid();
} else {
    bottom();
    translate([0, case_width + 12, 0]) lid();
}
